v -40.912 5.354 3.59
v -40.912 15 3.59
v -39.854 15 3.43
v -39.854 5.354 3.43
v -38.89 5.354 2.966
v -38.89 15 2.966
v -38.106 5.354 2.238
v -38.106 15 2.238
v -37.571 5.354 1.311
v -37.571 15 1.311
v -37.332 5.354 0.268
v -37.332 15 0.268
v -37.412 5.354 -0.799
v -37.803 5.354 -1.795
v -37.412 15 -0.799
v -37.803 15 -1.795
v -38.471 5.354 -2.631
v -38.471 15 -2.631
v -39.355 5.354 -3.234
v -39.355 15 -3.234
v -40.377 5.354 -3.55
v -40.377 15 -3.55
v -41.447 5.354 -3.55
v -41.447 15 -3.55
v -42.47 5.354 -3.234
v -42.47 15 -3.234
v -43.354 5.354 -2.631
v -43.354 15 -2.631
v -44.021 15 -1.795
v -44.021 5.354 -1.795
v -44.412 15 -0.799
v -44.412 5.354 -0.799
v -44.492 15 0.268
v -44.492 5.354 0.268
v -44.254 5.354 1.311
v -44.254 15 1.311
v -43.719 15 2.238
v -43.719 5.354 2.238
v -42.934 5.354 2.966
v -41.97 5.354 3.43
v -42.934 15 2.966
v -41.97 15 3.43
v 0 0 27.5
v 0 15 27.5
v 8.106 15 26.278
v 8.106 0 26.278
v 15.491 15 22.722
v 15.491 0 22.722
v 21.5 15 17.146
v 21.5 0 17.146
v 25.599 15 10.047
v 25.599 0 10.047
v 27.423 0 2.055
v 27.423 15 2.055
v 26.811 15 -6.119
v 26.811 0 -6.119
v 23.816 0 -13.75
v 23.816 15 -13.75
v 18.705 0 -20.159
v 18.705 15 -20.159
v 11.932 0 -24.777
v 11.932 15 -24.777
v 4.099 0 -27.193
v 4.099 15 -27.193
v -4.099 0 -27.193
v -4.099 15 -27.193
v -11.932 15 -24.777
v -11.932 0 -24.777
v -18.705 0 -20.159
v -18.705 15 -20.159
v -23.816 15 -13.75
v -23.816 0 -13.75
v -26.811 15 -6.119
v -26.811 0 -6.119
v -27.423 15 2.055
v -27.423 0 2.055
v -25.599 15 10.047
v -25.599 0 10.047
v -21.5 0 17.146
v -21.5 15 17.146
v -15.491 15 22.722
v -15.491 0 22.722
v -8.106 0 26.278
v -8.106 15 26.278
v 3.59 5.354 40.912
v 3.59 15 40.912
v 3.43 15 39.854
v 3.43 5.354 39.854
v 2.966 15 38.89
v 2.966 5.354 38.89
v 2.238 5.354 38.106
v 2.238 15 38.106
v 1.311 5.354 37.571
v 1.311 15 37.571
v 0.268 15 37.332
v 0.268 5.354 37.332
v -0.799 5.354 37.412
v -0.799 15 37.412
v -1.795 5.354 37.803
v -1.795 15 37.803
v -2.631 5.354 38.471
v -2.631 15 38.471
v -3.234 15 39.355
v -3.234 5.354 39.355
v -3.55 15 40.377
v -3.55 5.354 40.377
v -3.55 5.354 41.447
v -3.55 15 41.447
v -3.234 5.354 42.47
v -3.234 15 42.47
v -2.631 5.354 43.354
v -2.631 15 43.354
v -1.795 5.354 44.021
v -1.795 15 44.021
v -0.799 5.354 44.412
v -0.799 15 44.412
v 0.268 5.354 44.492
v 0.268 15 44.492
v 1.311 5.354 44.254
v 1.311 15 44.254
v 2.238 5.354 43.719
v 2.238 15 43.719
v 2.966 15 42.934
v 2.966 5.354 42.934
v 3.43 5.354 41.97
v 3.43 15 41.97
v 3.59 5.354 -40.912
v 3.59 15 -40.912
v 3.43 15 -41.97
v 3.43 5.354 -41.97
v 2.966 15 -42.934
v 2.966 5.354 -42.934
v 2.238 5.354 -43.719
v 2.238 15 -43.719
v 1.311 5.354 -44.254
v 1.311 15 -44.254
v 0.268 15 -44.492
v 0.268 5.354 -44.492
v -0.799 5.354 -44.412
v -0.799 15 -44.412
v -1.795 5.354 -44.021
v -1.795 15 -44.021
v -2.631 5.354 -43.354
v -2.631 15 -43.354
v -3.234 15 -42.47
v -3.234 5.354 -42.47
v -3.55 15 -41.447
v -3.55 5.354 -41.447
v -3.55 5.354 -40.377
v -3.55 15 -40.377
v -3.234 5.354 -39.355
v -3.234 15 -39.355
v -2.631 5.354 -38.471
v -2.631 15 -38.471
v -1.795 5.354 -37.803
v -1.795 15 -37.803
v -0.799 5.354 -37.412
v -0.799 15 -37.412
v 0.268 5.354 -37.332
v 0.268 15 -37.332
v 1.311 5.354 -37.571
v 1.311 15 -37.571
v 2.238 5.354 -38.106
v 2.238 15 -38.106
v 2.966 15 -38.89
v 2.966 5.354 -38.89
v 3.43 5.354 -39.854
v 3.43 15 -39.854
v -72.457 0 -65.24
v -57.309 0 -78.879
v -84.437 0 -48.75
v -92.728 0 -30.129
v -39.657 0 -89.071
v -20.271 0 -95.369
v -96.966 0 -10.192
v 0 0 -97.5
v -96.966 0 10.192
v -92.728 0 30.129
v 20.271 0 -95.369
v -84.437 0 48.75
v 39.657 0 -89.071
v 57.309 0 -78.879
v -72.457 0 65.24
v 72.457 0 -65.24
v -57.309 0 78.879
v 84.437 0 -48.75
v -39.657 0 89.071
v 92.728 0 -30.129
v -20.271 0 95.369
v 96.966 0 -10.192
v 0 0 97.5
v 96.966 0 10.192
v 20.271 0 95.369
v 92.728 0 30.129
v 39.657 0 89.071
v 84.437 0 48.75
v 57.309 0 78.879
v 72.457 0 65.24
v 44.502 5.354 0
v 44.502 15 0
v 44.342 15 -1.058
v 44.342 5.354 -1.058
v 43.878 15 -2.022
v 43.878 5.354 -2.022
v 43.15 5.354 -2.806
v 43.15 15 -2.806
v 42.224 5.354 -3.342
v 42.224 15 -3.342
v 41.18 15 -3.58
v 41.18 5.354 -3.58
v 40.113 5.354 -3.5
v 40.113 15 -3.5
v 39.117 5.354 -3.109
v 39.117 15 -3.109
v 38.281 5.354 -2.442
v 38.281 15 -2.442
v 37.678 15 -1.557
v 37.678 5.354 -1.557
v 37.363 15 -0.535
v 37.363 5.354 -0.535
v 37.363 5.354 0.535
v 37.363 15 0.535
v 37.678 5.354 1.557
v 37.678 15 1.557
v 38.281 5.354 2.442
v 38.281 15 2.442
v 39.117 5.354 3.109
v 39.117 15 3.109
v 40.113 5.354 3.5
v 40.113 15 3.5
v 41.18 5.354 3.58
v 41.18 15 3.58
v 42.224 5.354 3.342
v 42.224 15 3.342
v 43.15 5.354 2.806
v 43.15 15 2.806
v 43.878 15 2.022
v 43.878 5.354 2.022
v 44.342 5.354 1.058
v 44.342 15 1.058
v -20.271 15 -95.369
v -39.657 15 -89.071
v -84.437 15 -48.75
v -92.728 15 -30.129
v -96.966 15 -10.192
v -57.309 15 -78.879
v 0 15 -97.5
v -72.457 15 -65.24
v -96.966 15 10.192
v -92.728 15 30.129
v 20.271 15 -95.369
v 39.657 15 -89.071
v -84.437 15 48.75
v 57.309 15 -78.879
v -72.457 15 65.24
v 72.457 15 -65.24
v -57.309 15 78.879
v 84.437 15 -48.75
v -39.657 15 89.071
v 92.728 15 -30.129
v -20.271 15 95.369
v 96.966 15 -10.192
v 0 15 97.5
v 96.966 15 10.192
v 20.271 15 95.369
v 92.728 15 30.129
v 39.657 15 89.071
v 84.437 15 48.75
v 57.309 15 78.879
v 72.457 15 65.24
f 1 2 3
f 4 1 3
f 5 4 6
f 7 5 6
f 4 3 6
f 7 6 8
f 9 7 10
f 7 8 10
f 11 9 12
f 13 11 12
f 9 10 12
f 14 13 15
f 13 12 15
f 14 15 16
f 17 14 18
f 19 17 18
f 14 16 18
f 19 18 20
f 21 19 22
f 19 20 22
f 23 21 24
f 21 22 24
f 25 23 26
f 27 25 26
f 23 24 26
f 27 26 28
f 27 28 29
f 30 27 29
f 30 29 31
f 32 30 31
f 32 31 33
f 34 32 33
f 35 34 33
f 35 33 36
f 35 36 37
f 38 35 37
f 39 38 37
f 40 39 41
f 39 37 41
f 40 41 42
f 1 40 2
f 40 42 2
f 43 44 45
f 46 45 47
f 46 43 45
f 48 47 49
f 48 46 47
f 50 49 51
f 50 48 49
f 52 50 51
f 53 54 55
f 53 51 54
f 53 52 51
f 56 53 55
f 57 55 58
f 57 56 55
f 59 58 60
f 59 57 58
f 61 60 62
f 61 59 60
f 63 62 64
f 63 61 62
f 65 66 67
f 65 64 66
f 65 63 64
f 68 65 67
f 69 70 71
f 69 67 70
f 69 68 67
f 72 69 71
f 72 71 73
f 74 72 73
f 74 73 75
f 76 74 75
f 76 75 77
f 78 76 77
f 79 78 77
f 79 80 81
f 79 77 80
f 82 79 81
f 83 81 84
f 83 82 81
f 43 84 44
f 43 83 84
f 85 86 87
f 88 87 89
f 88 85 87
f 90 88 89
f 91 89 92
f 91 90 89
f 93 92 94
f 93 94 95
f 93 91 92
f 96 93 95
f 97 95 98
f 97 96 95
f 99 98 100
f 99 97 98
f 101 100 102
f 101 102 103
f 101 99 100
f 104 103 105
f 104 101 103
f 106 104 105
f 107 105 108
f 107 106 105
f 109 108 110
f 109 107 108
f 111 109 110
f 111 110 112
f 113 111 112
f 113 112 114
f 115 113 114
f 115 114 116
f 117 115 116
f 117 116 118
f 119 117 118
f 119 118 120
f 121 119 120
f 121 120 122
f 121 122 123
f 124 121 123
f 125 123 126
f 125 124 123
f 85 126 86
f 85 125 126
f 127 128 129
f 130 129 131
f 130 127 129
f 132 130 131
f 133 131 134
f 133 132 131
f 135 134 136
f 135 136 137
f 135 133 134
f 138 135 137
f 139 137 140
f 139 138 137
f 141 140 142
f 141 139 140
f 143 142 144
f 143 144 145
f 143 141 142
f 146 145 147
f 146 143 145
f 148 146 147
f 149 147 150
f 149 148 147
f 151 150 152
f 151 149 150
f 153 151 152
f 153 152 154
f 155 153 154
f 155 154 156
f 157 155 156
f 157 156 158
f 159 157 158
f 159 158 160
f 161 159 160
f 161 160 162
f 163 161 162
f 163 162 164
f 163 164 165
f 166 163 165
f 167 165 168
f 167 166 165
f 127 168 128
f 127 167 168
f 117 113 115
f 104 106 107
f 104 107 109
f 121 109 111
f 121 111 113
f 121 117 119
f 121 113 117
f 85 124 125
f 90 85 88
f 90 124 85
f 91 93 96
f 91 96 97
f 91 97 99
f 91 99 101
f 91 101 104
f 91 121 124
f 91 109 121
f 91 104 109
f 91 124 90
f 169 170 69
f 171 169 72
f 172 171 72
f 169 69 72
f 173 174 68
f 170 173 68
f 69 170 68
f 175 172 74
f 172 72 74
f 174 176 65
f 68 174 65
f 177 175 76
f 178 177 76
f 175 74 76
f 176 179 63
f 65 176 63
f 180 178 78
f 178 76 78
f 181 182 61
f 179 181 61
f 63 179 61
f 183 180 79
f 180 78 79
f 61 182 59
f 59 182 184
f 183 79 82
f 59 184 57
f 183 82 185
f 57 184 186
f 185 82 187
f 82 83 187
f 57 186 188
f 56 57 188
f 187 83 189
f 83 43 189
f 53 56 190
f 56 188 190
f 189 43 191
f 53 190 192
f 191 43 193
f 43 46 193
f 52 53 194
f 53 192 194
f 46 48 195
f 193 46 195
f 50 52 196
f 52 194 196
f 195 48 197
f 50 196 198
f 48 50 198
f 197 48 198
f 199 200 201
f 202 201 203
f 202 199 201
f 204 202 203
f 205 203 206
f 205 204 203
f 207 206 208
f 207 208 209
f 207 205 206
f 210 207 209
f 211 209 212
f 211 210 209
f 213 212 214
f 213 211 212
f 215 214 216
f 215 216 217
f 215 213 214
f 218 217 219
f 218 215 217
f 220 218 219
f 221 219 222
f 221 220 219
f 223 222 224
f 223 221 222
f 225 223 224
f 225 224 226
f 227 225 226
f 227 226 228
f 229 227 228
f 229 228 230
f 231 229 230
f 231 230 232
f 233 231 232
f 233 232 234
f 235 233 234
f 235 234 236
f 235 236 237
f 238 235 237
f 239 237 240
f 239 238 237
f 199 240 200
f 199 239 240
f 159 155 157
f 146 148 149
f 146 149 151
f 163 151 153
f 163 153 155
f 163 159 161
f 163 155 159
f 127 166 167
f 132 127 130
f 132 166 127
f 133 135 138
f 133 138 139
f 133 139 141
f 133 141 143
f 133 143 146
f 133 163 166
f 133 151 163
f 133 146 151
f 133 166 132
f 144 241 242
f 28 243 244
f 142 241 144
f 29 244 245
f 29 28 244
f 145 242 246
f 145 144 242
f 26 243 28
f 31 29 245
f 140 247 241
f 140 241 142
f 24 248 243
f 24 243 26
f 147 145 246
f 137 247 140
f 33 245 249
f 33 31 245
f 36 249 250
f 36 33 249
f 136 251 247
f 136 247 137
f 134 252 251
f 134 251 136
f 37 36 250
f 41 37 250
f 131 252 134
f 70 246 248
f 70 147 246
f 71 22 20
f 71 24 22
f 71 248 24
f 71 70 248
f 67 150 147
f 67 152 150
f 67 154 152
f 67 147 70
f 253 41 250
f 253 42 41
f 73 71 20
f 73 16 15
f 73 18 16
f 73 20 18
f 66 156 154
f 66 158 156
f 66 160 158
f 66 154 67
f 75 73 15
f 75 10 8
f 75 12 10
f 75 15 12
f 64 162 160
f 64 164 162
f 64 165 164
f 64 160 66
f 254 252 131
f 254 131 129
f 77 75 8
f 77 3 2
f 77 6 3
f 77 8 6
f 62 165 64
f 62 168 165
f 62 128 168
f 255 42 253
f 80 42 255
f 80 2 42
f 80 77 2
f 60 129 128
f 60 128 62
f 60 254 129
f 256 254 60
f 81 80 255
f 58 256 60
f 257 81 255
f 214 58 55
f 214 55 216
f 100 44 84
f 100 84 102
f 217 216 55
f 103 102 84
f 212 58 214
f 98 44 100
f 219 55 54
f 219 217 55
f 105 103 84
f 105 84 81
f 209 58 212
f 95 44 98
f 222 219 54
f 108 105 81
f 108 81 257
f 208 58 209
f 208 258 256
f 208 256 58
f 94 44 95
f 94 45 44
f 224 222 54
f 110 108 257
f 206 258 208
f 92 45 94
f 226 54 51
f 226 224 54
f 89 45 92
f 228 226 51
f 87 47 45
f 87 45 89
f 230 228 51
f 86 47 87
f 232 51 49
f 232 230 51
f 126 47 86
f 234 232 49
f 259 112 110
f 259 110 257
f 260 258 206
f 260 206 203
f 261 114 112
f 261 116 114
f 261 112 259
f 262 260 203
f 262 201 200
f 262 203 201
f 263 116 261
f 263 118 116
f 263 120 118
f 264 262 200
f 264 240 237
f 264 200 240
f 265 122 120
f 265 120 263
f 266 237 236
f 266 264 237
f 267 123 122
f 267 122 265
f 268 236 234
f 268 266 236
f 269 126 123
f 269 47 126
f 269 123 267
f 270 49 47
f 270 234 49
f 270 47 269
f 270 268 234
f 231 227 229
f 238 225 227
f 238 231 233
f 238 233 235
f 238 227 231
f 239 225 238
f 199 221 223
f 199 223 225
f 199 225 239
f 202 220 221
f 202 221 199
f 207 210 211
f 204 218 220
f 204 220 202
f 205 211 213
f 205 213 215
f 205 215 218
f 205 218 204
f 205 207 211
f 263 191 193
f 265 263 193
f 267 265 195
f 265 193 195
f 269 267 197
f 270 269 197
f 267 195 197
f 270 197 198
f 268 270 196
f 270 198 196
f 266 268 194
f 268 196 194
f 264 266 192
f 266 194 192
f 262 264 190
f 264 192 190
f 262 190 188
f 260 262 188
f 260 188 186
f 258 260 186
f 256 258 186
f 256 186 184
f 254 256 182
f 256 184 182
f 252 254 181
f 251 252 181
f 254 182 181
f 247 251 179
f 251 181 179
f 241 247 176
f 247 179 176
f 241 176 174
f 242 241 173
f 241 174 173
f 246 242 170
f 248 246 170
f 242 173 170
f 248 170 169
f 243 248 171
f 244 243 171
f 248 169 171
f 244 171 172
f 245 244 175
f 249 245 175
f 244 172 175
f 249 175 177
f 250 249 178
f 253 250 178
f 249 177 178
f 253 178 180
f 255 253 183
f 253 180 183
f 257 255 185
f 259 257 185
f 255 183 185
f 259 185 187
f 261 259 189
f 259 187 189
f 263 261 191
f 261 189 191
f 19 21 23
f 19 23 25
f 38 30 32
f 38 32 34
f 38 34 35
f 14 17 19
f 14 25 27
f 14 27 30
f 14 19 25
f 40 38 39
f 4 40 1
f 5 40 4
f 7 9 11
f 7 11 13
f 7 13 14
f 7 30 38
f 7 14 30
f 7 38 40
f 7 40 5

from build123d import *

# Parameters (mm, degrees)
SKETCH1_R           = 97.5
BOSS_EXTRUDE1_DEPTH = 15
SKETCH2_R           = 27.5
CUT_EXTRUDE1_DEPTH  = 139.699315067
SKETCH3_R           = 3.589640567
CUT_EXTRUDE2_DEPTH  = 9.646154374
CIRPATTERN1_COUNT   = 4


with BuildPart() as part:
    # Sketch1 → Boss-Extrude1 (new body)
    with BuildSketch(Plane(origin=(0, 0, 0), x_dir=(1, 0, 0), z_dir=(0, 1, 0))):
        Circle(SKETCH1_R)
    extrude(amount=BOSS_EXTRUDE1_DEPTH)

    # Sketch2 → Cut-Extrude1 (cut, through all)
    with BuildSketch(Plane(origin=(0, 0, 0), x_dir=(1, 0, 0), z_dir=(0, 1, 0))):
        Circle(SKETCH2_R)
    extrude(amount=CUT_EXTRUDE1_DEPTH, mode=Mode.SUBTRACT)

    # Sketch3 → Cut-Extrude2 (cut)
    with BuildSketch(Plane(origin=(0, 15, 0), x_dir=(1, 0, 0), z_dir=(0, 1, 0))):
        with Locations((-40.912084687, 0)):
            Circle(SKETCH3_R)
    cut_extrude2 = extrude(amount=-CUT_EXTRUDE2_DEPTH, mode=Mode.SUBTRACT)

    # CirPattern1: Cut-Extrude2 ×4 about axis
    cirpattern1_axis = Axis((0, 0, 0), (0, 1, 0))
    for i in range(1, CIRPATTERN1_COUNT):
        add(cut_extrude2.rotate(cirpattern1_axis, i * 360 / CIRPATTERN1_COUNT), mode=Mode.SUBTRACT)


solid = part.part
